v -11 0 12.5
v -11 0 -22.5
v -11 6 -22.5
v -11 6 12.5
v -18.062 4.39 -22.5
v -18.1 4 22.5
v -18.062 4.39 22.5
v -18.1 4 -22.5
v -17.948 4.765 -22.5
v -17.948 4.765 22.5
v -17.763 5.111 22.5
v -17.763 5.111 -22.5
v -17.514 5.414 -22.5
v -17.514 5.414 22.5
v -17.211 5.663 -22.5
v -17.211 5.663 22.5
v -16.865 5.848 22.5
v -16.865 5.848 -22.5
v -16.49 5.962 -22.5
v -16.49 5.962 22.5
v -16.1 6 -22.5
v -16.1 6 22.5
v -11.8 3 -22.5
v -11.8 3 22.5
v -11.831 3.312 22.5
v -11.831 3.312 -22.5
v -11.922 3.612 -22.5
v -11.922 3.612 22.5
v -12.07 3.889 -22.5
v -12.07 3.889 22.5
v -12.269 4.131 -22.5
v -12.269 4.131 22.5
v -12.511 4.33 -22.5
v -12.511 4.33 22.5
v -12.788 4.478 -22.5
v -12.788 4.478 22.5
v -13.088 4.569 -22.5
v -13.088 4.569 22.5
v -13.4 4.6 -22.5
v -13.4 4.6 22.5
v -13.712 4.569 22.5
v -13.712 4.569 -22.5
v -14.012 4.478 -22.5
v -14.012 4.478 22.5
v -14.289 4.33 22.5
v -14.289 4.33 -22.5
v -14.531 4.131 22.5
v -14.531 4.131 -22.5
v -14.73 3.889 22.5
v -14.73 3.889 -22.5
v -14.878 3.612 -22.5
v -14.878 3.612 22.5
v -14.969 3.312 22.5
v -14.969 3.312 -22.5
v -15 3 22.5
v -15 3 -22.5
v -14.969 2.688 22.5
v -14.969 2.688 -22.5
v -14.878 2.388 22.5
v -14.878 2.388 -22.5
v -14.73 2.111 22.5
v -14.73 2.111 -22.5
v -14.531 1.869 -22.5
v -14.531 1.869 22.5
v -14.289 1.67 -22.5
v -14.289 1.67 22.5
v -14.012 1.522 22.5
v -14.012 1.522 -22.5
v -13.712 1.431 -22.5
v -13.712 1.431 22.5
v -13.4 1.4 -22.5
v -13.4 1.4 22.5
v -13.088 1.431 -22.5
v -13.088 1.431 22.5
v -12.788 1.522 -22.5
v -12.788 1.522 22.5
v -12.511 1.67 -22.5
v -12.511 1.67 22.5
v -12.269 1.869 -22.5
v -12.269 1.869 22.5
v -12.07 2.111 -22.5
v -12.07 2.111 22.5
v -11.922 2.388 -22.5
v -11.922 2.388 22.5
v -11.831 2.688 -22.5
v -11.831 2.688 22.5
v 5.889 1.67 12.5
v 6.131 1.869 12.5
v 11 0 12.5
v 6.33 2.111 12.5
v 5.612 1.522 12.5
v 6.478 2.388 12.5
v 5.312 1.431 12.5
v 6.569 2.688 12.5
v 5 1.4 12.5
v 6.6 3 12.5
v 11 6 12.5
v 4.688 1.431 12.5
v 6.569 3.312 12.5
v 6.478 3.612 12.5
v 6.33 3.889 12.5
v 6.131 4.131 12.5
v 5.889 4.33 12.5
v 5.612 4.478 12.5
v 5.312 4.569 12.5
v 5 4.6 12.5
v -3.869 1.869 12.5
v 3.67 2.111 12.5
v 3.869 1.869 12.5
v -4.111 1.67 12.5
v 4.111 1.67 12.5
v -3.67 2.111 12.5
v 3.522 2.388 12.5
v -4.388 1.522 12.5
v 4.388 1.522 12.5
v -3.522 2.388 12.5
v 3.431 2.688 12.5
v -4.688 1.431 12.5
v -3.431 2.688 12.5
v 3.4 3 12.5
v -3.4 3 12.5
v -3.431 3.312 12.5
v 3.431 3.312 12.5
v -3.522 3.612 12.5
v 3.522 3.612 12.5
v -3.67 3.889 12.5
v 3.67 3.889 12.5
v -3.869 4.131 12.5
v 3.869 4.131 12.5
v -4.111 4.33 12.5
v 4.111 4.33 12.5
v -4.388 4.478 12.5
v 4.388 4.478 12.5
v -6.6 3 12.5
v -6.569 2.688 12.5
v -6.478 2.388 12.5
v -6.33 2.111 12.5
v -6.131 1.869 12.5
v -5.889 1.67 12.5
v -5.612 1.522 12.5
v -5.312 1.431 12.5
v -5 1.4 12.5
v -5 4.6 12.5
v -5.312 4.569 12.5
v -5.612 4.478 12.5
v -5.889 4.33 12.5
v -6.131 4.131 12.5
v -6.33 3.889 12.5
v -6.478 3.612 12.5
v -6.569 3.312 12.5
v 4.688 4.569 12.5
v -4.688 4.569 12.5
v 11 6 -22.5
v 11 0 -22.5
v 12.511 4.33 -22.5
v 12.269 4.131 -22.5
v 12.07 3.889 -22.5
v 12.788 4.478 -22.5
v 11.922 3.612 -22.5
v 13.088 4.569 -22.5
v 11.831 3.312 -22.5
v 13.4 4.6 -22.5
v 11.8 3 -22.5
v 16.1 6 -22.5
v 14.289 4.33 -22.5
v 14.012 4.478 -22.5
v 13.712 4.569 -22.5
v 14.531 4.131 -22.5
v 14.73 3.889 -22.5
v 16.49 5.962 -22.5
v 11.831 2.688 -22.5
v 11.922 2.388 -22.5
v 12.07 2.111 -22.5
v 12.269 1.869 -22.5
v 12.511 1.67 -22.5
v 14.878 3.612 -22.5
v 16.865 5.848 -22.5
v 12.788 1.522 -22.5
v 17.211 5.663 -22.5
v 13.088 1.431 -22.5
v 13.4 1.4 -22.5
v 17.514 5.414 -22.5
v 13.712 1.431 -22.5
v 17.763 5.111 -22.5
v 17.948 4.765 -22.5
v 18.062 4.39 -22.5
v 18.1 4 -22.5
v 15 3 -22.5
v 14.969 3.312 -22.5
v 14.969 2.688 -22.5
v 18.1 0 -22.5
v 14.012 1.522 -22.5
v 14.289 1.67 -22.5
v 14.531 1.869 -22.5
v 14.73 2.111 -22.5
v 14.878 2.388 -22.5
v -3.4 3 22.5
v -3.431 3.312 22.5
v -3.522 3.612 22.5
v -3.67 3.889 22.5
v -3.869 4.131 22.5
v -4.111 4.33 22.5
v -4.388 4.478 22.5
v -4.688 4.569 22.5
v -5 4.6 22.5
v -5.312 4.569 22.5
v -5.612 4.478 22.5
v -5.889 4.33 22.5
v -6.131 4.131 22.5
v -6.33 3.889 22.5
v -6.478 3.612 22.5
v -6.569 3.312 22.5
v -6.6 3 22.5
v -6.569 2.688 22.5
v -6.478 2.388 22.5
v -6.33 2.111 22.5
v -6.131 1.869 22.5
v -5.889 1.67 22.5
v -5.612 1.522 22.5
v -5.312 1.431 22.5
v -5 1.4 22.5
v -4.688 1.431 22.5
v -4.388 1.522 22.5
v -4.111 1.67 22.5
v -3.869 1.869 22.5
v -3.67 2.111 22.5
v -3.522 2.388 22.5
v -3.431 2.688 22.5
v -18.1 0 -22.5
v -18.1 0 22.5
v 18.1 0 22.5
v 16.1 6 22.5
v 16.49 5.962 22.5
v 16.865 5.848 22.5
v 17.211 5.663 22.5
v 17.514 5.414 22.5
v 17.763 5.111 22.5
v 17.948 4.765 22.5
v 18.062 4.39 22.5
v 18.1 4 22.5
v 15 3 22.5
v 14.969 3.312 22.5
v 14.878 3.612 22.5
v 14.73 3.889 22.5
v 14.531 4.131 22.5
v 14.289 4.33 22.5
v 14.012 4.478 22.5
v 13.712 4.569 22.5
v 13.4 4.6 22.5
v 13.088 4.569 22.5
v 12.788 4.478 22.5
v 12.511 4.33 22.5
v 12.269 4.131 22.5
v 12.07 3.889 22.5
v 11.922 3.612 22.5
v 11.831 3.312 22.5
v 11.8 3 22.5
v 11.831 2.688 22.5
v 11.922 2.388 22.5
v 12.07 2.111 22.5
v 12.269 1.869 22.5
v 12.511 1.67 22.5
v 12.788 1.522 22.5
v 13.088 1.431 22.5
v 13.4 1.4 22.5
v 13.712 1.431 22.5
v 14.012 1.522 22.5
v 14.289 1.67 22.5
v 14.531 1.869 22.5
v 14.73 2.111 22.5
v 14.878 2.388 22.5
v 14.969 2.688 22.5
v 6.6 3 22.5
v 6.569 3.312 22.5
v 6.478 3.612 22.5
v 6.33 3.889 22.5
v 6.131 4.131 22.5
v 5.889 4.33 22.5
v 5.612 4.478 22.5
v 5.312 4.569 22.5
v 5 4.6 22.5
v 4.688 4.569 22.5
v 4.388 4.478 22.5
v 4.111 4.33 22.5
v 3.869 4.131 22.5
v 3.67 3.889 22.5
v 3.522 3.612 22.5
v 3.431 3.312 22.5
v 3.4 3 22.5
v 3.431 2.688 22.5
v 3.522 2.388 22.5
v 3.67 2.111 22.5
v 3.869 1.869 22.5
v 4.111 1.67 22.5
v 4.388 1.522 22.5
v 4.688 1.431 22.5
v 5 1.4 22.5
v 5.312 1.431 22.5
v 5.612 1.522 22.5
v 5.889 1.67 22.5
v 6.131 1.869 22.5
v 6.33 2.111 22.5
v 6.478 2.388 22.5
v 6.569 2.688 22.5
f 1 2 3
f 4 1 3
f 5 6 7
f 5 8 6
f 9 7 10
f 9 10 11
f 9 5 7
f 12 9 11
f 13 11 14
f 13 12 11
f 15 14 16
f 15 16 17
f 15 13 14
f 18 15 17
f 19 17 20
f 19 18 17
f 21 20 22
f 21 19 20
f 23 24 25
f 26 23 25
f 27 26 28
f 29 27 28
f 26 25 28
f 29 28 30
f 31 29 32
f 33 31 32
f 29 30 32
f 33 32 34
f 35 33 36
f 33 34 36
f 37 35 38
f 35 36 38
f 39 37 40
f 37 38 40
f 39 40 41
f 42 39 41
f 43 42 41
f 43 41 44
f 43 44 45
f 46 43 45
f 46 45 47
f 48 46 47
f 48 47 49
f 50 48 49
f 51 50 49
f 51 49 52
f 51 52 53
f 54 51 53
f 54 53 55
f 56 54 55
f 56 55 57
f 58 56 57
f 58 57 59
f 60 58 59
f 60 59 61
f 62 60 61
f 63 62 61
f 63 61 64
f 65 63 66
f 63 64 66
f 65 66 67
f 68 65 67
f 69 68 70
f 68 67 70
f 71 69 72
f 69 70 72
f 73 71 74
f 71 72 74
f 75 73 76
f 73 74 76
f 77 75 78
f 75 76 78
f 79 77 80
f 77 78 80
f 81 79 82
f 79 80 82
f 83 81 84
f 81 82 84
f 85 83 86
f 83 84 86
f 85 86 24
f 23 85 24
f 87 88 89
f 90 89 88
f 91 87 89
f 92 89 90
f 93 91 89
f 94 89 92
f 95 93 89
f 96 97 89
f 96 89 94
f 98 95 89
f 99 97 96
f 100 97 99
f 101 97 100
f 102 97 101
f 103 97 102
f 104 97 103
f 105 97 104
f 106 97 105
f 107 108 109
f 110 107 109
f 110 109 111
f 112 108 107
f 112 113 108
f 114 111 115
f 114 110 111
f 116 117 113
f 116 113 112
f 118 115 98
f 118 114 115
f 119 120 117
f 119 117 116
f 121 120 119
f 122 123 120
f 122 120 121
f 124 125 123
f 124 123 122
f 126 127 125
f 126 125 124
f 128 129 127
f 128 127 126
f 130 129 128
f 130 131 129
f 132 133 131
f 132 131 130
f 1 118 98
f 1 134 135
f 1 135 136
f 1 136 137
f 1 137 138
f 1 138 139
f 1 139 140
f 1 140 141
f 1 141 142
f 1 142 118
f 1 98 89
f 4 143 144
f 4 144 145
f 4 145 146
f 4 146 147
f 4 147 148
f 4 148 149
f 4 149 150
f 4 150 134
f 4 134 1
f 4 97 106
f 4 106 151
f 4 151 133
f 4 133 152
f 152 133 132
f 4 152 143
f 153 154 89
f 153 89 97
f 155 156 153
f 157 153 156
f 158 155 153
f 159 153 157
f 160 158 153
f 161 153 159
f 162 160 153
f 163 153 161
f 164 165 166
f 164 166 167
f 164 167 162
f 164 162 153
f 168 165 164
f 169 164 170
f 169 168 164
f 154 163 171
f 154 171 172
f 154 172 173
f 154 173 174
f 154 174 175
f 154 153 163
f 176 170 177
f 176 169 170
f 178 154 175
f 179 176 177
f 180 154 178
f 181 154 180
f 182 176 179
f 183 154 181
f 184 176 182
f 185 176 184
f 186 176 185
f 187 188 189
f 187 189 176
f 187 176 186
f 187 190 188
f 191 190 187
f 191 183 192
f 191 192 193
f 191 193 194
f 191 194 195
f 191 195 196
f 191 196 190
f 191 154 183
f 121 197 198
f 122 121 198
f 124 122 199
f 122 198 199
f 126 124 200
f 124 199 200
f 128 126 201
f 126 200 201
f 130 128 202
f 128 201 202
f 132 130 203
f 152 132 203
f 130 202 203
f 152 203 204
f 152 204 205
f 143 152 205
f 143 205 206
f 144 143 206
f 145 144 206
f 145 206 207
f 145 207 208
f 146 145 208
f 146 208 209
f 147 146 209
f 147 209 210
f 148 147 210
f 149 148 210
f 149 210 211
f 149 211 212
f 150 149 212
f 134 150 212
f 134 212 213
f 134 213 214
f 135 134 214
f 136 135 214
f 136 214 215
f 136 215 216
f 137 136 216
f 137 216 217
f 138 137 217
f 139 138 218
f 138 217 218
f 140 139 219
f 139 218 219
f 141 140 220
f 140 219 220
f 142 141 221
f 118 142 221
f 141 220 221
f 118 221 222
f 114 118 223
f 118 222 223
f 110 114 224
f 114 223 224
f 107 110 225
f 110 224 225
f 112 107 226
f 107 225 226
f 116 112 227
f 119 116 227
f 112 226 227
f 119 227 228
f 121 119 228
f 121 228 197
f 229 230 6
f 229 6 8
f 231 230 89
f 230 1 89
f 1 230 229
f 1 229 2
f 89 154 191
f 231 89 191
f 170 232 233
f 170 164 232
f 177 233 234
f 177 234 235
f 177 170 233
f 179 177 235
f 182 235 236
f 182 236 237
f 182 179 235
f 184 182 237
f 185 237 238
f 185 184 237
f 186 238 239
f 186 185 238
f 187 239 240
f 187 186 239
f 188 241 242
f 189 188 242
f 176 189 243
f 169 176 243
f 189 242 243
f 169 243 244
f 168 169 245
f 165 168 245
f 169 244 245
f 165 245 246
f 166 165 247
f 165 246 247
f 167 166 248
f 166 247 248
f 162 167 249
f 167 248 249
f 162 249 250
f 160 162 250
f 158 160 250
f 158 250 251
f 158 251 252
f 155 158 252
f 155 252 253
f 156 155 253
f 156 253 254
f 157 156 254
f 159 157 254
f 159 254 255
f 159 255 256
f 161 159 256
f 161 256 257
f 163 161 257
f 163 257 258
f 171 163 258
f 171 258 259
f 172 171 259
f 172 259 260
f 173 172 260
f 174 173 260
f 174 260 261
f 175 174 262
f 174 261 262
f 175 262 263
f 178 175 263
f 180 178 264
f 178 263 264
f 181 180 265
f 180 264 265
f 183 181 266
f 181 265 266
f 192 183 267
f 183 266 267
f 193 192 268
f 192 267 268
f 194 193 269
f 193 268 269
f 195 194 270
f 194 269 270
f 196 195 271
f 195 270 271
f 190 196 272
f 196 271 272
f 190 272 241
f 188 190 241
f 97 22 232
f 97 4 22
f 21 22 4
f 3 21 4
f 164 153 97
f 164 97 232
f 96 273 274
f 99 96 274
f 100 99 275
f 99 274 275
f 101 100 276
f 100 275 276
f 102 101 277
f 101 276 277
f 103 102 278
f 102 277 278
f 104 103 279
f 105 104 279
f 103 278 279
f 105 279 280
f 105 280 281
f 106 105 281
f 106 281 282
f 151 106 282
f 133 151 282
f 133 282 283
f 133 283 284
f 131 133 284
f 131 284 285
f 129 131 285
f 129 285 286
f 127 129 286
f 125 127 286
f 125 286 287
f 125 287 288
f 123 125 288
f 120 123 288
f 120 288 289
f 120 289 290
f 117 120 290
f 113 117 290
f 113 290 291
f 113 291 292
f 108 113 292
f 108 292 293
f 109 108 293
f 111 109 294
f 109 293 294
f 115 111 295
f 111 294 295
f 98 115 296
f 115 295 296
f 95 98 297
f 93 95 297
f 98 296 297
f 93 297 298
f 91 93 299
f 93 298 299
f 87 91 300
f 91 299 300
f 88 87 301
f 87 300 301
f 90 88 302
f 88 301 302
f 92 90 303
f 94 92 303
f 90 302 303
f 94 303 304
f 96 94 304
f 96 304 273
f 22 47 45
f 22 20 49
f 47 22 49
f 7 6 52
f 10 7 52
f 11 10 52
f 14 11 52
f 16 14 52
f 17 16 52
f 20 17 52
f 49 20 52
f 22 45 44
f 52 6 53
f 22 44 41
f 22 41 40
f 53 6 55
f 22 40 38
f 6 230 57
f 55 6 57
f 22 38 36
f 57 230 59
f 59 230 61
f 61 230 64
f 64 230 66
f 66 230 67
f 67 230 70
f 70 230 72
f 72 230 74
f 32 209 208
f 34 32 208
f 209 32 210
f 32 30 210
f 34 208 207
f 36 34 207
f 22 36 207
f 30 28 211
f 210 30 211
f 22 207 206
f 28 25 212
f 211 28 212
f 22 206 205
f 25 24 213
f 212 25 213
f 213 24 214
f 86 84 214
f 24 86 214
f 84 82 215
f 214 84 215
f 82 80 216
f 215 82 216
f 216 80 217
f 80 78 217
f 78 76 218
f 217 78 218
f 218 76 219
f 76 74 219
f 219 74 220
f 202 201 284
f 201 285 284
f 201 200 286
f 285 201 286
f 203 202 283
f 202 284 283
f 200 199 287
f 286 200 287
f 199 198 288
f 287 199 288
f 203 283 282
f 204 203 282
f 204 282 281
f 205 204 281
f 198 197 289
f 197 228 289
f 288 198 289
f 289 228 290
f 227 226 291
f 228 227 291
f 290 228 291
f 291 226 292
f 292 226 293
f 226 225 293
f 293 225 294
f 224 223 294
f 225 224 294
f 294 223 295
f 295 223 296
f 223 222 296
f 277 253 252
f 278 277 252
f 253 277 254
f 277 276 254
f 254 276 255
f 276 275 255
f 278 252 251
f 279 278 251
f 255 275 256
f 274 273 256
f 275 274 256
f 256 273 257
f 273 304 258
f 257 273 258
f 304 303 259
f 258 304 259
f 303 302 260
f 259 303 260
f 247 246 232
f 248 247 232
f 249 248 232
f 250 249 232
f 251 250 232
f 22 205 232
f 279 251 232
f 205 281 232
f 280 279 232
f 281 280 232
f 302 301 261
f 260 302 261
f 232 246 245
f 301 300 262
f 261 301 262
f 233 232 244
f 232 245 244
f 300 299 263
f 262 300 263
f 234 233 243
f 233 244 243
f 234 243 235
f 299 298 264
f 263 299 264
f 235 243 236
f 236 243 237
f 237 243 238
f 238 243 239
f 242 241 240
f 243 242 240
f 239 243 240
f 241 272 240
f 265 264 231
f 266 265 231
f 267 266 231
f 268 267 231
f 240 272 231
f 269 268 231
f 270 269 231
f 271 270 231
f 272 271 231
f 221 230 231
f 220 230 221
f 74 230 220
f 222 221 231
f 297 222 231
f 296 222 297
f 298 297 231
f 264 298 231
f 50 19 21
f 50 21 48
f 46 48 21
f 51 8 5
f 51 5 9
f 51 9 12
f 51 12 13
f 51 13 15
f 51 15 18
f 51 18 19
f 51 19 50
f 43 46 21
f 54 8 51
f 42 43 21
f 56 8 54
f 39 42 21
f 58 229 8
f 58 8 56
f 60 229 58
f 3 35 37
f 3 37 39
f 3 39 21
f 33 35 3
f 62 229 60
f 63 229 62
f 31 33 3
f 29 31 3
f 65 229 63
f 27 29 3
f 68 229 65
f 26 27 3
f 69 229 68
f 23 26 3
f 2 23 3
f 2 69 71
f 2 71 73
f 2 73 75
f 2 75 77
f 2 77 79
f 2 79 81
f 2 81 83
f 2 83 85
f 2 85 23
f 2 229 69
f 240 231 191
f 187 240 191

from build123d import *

# Parameters (mm, degrees)
SKETCH1_W           = 36.2
SKETCH1_H           = 45
BOSS_EXTRUDE1_DEPTH = 6
SKETCH2_R           = 1.6
CUT_EXTRUDE1_DEPTH  = 49.873407902
SKETCH4_W           = 22
SKETCH4_H           = 6
CUT_EXTRUDE2_DEPTH  = 35
FILLET1_R           = 2


with BuildPart() as part:
    # Sketch1 → Boss-Extrude1 (new body)
    with BuildSketch(Plane(origin=(0, 0, 0), x_dir=(1, 0, 0), z_dir=(0, 1, 0))):
        Rectangle(SKETCH1_W, SKETCH1_H)
    extrude(amount=BOSS_EXTRUDE1_DEPTH)

    # Sketch2 → Cut-Extrude1 (cut, through all)
    with BuildSketch(Plane.XY.offset(22.5)):
        with Locations((-5, 3)):
            Circle(SKETCH2_R)
        with Locations((-13.4, 3)):
            Circle(SKETCH2_R)
        with Locations((5, 3)):
            Circle(SKETCH2_R)
        with Locations((13.4, 3)):
            Circle(SKETCH2_R)
    extrude(amount=-CUT_EXTRUDE1_DEPTH, mode=Mode.SUBTRACT)

    # Sketch4 → Cut-Extrude2 (cut)
    with BuildSketch(Plane(origin=(0, 0, -22.5), x_dir=(-1, 0, 0), z_dir=(0, 0, -1))):
        with Locations((0, 3)):
            Rectangle(SKETCH4_W, SKETCH4_H)
    extrude(amount=-CUT_EXTRUDE2_DEPTH, mode=Mode.SUBTRACT)

    # Fillet1
    fillet1_edges = [part.edges().sort_by_distance(p)[0] for p in [
        (-18.1, 6, 0),
        (18.1, 6, 0),
    ]]
    fillet(fillet1_edges, radius=FILLET1_R)


solid = part.part
